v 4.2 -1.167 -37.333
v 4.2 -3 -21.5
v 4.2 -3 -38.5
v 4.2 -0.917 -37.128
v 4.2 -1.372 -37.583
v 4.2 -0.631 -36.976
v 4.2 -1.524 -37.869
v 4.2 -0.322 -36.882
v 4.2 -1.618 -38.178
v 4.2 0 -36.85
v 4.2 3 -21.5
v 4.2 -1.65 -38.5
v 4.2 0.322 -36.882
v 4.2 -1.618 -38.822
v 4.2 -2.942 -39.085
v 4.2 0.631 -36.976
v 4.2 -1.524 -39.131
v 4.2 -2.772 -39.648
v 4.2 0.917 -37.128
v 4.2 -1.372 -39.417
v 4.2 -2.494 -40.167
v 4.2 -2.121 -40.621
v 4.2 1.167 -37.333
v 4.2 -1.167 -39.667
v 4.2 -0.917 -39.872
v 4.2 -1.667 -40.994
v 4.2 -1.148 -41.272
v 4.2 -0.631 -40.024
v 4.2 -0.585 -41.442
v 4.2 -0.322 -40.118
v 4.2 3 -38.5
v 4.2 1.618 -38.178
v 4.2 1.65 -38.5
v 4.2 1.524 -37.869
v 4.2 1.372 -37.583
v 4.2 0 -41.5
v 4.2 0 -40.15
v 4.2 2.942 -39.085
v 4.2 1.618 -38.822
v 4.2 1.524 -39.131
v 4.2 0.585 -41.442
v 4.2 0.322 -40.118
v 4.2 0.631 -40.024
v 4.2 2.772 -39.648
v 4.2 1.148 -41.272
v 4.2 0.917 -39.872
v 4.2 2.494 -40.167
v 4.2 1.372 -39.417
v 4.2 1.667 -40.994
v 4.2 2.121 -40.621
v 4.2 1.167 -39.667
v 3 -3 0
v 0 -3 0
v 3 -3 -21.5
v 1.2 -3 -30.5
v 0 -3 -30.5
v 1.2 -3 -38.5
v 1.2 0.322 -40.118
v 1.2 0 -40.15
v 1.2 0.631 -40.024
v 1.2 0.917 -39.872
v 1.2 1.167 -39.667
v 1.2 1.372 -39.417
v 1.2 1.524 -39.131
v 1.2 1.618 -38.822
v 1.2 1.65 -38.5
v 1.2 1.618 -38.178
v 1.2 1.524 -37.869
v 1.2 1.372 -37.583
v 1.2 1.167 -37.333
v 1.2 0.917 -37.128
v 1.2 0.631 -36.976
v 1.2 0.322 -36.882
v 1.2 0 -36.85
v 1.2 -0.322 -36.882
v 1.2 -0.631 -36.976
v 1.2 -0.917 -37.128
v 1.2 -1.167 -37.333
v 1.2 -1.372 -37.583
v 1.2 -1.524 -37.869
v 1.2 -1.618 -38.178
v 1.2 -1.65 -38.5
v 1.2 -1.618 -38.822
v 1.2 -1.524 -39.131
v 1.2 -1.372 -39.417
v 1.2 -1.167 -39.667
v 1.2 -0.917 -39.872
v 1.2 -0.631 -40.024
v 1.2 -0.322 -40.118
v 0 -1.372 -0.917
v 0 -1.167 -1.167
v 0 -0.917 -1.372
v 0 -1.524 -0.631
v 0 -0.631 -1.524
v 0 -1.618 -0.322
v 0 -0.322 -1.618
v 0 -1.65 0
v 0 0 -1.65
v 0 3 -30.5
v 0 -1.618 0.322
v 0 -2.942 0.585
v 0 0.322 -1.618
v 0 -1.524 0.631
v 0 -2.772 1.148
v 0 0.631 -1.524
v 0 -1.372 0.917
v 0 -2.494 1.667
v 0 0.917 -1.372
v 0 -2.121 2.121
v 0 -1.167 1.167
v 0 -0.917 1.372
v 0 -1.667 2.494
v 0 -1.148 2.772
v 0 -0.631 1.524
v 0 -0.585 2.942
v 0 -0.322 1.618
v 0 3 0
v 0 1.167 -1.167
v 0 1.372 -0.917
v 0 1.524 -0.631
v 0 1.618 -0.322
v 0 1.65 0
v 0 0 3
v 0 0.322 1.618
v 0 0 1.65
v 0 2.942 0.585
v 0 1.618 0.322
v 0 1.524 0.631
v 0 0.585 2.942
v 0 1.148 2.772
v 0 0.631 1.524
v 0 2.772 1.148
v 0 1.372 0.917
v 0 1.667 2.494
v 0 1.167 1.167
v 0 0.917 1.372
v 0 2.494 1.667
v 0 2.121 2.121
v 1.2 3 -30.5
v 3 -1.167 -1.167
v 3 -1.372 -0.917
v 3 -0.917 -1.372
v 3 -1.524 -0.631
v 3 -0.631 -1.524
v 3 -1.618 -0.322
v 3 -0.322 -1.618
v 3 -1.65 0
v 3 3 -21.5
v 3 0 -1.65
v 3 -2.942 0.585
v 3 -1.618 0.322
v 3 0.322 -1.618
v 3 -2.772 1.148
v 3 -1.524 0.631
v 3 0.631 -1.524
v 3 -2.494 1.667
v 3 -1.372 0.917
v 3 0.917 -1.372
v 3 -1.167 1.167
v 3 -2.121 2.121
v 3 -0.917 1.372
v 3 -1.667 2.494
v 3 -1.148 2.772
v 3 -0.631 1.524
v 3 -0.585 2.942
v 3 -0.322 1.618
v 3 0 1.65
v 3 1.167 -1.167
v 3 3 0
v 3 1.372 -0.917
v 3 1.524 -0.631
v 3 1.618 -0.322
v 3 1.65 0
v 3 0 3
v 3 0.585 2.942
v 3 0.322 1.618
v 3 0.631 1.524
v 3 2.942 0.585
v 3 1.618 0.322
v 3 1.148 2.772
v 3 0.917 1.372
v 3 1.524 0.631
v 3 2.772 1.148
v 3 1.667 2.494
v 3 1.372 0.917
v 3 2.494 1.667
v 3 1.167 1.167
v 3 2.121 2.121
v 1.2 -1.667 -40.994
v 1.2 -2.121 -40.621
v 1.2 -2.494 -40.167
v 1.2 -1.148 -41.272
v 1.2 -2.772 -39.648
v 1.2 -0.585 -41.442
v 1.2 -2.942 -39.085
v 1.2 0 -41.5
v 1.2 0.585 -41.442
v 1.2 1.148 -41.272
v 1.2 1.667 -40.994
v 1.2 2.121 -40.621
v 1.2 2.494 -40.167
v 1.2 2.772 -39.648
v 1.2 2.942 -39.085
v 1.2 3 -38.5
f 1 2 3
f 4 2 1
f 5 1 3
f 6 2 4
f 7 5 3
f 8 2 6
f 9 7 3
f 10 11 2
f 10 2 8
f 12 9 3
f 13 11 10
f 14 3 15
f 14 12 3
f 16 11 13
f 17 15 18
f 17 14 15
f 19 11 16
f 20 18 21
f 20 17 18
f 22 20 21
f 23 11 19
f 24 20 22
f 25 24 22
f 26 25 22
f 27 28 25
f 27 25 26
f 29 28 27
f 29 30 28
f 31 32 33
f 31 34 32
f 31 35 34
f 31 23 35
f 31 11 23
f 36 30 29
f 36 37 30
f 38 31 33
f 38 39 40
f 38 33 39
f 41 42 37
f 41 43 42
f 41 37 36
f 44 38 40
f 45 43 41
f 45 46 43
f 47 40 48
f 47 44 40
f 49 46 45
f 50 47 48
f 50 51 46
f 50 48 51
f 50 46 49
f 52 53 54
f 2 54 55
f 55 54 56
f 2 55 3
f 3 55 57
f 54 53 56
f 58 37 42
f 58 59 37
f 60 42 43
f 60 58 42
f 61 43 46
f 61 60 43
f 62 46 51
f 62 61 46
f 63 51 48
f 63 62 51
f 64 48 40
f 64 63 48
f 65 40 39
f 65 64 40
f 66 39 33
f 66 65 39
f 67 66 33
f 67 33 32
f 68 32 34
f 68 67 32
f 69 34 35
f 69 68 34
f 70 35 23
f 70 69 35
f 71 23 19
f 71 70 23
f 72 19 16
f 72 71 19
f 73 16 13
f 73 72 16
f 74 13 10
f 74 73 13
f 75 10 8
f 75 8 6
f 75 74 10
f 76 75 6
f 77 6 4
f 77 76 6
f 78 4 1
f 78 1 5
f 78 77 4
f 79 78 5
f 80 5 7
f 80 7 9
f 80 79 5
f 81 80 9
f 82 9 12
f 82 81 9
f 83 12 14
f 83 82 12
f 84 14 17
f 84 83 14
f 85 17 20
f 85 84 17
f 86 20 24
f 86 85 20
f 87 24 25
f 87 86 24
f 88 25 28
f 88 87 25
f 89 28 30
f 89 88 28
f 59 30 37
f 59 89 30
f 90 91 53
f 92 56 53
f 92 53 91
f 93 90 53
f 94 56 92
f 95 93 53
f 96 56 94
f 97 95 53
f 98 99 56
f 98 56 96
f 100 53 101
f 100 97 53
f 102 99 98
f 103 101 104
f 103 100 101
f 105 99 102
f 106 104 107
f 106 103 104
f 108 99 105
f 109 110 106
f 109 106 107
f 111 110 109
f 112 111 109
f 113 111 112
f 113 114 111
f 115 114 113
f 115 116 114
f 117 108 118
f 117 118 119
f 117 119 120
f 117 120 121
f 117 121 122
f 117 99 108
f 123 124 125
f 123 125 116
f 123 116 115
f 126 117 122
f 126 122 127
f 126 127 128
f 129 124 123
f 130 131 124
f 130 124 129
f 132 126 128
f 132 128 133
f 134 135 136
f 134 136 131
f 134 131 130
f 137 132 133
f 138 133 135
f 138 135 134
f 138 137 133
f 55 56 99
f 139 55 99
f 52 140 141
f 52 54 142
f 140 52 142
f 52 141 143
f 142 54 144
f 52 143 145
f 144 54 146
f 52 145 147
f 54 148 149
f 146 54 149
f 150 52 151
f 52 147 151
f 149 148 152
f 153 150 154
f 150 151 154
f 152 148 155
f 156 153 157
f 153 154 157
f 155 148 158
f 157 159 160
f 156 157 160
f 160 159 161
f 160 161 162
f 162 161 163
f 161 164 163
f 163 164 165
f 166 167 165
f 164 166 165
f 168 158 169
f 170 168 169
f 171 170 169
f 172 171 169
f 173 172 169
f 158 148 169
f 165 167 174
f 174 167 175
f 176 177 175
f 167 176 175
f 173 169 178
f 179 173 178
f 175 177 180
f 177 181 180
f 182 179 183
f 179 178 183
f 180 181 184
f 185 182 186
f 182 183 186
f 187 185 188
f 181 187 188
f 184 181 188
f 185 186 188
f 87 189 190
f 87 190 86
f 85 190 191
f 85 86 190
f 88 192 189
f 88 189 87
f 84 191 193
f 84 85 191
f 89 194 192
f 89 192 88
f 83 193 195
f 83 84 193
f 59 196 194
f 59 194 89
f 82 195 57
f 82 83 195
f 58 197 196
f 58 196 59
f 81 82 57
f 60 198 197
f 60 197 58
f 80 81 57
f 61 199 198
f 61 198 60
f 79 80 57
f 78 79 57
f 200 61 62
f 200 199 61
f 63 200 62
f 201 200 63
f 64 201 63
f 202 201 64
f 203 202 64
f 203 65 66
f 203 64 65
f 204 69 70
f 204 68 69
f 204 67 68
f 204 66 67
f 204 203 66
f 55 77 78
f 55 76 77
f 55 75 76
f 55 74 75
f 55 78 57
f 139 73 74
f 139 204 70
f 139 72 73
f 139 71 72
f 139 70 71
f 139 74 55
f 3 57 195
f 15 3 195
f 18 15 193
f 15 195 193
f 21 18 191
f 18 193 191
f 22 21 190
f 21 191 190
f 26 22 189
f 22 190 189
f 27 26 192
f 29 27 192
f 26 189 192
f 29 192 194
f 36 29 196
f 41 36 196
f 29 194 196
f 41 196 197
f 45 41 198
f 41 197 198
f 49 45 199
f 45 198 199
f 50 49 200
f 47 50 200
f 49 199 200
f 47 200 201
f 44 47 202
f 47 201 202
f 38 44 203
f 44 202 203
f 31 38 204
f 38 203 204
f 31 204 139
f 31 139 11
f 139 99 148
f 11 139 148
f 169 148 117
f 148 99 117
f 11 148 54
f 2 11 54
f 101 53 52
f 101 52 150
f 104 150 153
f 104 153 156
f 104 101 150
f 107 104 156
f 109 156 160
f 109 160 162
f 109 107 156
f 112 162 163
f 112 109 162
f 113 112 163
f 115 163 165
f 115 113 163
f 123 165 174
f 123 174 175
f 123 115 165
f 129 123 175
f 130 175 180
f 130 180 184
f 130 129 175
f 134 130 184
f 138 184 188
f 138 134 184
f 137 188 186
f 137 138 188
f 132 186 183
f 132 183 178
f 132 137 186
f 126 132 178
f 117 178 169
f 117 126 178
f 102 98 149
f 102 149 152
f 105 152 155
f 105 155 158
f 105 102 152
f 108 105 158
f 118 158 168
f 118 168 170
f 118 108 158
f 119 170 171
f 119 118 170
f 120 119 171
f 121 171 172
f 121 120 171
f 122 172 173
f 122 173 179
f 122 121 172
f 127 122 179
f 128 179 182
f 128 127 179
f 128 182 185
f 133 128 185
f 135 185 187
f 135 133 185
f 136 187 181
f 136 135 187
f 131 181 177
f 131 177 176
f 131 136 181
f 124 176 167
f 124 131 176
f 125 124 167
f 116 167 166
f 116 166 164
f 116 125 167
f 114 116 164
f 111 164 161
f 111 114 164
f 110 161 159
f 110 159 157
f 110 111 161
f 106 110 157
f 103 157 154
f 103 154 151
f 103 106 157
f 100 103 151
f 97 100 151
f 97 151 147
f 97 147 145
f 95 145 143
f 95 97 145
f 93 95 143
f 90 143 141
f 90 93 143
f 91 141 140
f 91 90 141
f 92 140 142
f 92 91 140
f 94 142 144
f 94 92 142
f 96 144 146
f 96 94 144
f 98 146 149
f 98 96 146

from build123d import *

# Parameters (mm, degrees)
SKETCH1_R           = 1.65
BOSS_EXTRUDE1_DEPTH = 3
SKETCH3_W           = 11
SKETCH3_H           = 6
CUT_EXTRUDE2_DEPTH  = 1.2
SKETCH4_R           = 1.65
BOSS_EXTRUDE2_DEPTH = 1.2


with BuildPart() as part:
    # Sketch1 → Boss-Extrude1 (new body)
    with BuildSketch(Plane(origin=(0, 0, 0), x_dir=(0, 0, -1), z_dir=(1, 0, 0))):
        with BuildLine():
            Line((0, 3), (38.5, 3))
            ThreePointArc((38.5, 3), (41.5, 0), (38.5, -3))
            Line((38.5, -3), (0, -3))
            ThreePointArc((0, -3), (-3, 0), (0, 3))
        make_face()
        Circle(SKETCH1_R, mode=Mode.SUBTRACT)
        with Locations((38.5, 0)):
            Circle(SKETCH1_R, mode=Mode.SUBTRACT)
    extrude(amount=BOSS_EXTRUDE1_DEPTH)

    # Sketch3 → Cut-Extrude2 (cut)
    with BuildSketch(Plane.ZY):
        with Locations((-36, 0)):
            Rectangle(SKETCH3_W, SKETCH3_H)
    extrude(amount=-CUT_EXTRUDE2_DEPTH, mode=Mode.SUBTRACT)

    # Sketch4 → Boss-Extrude2 (add)
    with BuildSketch(Plane(origin=(3, 0, 0), x_dir=(0, 0, -1), z_dir=(1, 0, 0))):
        with BuildLine():
            Line((38.5, 3), (21.5, 3))
            Line((21.5, 3), (21.5, -3))
            Line((21.5, -3), (38.5, -3))
            ThreePointArc((38.5, -3), (41.5, 0), (38.5, 3))
        make_face()
        with Locations((38.5, 0)):
            Circle(SKETCH4_R, mode=Mode.SUBTRACT)
    extrude(amount=BOSS_EXTRUDE2_DEPTH)


solid = part.part
